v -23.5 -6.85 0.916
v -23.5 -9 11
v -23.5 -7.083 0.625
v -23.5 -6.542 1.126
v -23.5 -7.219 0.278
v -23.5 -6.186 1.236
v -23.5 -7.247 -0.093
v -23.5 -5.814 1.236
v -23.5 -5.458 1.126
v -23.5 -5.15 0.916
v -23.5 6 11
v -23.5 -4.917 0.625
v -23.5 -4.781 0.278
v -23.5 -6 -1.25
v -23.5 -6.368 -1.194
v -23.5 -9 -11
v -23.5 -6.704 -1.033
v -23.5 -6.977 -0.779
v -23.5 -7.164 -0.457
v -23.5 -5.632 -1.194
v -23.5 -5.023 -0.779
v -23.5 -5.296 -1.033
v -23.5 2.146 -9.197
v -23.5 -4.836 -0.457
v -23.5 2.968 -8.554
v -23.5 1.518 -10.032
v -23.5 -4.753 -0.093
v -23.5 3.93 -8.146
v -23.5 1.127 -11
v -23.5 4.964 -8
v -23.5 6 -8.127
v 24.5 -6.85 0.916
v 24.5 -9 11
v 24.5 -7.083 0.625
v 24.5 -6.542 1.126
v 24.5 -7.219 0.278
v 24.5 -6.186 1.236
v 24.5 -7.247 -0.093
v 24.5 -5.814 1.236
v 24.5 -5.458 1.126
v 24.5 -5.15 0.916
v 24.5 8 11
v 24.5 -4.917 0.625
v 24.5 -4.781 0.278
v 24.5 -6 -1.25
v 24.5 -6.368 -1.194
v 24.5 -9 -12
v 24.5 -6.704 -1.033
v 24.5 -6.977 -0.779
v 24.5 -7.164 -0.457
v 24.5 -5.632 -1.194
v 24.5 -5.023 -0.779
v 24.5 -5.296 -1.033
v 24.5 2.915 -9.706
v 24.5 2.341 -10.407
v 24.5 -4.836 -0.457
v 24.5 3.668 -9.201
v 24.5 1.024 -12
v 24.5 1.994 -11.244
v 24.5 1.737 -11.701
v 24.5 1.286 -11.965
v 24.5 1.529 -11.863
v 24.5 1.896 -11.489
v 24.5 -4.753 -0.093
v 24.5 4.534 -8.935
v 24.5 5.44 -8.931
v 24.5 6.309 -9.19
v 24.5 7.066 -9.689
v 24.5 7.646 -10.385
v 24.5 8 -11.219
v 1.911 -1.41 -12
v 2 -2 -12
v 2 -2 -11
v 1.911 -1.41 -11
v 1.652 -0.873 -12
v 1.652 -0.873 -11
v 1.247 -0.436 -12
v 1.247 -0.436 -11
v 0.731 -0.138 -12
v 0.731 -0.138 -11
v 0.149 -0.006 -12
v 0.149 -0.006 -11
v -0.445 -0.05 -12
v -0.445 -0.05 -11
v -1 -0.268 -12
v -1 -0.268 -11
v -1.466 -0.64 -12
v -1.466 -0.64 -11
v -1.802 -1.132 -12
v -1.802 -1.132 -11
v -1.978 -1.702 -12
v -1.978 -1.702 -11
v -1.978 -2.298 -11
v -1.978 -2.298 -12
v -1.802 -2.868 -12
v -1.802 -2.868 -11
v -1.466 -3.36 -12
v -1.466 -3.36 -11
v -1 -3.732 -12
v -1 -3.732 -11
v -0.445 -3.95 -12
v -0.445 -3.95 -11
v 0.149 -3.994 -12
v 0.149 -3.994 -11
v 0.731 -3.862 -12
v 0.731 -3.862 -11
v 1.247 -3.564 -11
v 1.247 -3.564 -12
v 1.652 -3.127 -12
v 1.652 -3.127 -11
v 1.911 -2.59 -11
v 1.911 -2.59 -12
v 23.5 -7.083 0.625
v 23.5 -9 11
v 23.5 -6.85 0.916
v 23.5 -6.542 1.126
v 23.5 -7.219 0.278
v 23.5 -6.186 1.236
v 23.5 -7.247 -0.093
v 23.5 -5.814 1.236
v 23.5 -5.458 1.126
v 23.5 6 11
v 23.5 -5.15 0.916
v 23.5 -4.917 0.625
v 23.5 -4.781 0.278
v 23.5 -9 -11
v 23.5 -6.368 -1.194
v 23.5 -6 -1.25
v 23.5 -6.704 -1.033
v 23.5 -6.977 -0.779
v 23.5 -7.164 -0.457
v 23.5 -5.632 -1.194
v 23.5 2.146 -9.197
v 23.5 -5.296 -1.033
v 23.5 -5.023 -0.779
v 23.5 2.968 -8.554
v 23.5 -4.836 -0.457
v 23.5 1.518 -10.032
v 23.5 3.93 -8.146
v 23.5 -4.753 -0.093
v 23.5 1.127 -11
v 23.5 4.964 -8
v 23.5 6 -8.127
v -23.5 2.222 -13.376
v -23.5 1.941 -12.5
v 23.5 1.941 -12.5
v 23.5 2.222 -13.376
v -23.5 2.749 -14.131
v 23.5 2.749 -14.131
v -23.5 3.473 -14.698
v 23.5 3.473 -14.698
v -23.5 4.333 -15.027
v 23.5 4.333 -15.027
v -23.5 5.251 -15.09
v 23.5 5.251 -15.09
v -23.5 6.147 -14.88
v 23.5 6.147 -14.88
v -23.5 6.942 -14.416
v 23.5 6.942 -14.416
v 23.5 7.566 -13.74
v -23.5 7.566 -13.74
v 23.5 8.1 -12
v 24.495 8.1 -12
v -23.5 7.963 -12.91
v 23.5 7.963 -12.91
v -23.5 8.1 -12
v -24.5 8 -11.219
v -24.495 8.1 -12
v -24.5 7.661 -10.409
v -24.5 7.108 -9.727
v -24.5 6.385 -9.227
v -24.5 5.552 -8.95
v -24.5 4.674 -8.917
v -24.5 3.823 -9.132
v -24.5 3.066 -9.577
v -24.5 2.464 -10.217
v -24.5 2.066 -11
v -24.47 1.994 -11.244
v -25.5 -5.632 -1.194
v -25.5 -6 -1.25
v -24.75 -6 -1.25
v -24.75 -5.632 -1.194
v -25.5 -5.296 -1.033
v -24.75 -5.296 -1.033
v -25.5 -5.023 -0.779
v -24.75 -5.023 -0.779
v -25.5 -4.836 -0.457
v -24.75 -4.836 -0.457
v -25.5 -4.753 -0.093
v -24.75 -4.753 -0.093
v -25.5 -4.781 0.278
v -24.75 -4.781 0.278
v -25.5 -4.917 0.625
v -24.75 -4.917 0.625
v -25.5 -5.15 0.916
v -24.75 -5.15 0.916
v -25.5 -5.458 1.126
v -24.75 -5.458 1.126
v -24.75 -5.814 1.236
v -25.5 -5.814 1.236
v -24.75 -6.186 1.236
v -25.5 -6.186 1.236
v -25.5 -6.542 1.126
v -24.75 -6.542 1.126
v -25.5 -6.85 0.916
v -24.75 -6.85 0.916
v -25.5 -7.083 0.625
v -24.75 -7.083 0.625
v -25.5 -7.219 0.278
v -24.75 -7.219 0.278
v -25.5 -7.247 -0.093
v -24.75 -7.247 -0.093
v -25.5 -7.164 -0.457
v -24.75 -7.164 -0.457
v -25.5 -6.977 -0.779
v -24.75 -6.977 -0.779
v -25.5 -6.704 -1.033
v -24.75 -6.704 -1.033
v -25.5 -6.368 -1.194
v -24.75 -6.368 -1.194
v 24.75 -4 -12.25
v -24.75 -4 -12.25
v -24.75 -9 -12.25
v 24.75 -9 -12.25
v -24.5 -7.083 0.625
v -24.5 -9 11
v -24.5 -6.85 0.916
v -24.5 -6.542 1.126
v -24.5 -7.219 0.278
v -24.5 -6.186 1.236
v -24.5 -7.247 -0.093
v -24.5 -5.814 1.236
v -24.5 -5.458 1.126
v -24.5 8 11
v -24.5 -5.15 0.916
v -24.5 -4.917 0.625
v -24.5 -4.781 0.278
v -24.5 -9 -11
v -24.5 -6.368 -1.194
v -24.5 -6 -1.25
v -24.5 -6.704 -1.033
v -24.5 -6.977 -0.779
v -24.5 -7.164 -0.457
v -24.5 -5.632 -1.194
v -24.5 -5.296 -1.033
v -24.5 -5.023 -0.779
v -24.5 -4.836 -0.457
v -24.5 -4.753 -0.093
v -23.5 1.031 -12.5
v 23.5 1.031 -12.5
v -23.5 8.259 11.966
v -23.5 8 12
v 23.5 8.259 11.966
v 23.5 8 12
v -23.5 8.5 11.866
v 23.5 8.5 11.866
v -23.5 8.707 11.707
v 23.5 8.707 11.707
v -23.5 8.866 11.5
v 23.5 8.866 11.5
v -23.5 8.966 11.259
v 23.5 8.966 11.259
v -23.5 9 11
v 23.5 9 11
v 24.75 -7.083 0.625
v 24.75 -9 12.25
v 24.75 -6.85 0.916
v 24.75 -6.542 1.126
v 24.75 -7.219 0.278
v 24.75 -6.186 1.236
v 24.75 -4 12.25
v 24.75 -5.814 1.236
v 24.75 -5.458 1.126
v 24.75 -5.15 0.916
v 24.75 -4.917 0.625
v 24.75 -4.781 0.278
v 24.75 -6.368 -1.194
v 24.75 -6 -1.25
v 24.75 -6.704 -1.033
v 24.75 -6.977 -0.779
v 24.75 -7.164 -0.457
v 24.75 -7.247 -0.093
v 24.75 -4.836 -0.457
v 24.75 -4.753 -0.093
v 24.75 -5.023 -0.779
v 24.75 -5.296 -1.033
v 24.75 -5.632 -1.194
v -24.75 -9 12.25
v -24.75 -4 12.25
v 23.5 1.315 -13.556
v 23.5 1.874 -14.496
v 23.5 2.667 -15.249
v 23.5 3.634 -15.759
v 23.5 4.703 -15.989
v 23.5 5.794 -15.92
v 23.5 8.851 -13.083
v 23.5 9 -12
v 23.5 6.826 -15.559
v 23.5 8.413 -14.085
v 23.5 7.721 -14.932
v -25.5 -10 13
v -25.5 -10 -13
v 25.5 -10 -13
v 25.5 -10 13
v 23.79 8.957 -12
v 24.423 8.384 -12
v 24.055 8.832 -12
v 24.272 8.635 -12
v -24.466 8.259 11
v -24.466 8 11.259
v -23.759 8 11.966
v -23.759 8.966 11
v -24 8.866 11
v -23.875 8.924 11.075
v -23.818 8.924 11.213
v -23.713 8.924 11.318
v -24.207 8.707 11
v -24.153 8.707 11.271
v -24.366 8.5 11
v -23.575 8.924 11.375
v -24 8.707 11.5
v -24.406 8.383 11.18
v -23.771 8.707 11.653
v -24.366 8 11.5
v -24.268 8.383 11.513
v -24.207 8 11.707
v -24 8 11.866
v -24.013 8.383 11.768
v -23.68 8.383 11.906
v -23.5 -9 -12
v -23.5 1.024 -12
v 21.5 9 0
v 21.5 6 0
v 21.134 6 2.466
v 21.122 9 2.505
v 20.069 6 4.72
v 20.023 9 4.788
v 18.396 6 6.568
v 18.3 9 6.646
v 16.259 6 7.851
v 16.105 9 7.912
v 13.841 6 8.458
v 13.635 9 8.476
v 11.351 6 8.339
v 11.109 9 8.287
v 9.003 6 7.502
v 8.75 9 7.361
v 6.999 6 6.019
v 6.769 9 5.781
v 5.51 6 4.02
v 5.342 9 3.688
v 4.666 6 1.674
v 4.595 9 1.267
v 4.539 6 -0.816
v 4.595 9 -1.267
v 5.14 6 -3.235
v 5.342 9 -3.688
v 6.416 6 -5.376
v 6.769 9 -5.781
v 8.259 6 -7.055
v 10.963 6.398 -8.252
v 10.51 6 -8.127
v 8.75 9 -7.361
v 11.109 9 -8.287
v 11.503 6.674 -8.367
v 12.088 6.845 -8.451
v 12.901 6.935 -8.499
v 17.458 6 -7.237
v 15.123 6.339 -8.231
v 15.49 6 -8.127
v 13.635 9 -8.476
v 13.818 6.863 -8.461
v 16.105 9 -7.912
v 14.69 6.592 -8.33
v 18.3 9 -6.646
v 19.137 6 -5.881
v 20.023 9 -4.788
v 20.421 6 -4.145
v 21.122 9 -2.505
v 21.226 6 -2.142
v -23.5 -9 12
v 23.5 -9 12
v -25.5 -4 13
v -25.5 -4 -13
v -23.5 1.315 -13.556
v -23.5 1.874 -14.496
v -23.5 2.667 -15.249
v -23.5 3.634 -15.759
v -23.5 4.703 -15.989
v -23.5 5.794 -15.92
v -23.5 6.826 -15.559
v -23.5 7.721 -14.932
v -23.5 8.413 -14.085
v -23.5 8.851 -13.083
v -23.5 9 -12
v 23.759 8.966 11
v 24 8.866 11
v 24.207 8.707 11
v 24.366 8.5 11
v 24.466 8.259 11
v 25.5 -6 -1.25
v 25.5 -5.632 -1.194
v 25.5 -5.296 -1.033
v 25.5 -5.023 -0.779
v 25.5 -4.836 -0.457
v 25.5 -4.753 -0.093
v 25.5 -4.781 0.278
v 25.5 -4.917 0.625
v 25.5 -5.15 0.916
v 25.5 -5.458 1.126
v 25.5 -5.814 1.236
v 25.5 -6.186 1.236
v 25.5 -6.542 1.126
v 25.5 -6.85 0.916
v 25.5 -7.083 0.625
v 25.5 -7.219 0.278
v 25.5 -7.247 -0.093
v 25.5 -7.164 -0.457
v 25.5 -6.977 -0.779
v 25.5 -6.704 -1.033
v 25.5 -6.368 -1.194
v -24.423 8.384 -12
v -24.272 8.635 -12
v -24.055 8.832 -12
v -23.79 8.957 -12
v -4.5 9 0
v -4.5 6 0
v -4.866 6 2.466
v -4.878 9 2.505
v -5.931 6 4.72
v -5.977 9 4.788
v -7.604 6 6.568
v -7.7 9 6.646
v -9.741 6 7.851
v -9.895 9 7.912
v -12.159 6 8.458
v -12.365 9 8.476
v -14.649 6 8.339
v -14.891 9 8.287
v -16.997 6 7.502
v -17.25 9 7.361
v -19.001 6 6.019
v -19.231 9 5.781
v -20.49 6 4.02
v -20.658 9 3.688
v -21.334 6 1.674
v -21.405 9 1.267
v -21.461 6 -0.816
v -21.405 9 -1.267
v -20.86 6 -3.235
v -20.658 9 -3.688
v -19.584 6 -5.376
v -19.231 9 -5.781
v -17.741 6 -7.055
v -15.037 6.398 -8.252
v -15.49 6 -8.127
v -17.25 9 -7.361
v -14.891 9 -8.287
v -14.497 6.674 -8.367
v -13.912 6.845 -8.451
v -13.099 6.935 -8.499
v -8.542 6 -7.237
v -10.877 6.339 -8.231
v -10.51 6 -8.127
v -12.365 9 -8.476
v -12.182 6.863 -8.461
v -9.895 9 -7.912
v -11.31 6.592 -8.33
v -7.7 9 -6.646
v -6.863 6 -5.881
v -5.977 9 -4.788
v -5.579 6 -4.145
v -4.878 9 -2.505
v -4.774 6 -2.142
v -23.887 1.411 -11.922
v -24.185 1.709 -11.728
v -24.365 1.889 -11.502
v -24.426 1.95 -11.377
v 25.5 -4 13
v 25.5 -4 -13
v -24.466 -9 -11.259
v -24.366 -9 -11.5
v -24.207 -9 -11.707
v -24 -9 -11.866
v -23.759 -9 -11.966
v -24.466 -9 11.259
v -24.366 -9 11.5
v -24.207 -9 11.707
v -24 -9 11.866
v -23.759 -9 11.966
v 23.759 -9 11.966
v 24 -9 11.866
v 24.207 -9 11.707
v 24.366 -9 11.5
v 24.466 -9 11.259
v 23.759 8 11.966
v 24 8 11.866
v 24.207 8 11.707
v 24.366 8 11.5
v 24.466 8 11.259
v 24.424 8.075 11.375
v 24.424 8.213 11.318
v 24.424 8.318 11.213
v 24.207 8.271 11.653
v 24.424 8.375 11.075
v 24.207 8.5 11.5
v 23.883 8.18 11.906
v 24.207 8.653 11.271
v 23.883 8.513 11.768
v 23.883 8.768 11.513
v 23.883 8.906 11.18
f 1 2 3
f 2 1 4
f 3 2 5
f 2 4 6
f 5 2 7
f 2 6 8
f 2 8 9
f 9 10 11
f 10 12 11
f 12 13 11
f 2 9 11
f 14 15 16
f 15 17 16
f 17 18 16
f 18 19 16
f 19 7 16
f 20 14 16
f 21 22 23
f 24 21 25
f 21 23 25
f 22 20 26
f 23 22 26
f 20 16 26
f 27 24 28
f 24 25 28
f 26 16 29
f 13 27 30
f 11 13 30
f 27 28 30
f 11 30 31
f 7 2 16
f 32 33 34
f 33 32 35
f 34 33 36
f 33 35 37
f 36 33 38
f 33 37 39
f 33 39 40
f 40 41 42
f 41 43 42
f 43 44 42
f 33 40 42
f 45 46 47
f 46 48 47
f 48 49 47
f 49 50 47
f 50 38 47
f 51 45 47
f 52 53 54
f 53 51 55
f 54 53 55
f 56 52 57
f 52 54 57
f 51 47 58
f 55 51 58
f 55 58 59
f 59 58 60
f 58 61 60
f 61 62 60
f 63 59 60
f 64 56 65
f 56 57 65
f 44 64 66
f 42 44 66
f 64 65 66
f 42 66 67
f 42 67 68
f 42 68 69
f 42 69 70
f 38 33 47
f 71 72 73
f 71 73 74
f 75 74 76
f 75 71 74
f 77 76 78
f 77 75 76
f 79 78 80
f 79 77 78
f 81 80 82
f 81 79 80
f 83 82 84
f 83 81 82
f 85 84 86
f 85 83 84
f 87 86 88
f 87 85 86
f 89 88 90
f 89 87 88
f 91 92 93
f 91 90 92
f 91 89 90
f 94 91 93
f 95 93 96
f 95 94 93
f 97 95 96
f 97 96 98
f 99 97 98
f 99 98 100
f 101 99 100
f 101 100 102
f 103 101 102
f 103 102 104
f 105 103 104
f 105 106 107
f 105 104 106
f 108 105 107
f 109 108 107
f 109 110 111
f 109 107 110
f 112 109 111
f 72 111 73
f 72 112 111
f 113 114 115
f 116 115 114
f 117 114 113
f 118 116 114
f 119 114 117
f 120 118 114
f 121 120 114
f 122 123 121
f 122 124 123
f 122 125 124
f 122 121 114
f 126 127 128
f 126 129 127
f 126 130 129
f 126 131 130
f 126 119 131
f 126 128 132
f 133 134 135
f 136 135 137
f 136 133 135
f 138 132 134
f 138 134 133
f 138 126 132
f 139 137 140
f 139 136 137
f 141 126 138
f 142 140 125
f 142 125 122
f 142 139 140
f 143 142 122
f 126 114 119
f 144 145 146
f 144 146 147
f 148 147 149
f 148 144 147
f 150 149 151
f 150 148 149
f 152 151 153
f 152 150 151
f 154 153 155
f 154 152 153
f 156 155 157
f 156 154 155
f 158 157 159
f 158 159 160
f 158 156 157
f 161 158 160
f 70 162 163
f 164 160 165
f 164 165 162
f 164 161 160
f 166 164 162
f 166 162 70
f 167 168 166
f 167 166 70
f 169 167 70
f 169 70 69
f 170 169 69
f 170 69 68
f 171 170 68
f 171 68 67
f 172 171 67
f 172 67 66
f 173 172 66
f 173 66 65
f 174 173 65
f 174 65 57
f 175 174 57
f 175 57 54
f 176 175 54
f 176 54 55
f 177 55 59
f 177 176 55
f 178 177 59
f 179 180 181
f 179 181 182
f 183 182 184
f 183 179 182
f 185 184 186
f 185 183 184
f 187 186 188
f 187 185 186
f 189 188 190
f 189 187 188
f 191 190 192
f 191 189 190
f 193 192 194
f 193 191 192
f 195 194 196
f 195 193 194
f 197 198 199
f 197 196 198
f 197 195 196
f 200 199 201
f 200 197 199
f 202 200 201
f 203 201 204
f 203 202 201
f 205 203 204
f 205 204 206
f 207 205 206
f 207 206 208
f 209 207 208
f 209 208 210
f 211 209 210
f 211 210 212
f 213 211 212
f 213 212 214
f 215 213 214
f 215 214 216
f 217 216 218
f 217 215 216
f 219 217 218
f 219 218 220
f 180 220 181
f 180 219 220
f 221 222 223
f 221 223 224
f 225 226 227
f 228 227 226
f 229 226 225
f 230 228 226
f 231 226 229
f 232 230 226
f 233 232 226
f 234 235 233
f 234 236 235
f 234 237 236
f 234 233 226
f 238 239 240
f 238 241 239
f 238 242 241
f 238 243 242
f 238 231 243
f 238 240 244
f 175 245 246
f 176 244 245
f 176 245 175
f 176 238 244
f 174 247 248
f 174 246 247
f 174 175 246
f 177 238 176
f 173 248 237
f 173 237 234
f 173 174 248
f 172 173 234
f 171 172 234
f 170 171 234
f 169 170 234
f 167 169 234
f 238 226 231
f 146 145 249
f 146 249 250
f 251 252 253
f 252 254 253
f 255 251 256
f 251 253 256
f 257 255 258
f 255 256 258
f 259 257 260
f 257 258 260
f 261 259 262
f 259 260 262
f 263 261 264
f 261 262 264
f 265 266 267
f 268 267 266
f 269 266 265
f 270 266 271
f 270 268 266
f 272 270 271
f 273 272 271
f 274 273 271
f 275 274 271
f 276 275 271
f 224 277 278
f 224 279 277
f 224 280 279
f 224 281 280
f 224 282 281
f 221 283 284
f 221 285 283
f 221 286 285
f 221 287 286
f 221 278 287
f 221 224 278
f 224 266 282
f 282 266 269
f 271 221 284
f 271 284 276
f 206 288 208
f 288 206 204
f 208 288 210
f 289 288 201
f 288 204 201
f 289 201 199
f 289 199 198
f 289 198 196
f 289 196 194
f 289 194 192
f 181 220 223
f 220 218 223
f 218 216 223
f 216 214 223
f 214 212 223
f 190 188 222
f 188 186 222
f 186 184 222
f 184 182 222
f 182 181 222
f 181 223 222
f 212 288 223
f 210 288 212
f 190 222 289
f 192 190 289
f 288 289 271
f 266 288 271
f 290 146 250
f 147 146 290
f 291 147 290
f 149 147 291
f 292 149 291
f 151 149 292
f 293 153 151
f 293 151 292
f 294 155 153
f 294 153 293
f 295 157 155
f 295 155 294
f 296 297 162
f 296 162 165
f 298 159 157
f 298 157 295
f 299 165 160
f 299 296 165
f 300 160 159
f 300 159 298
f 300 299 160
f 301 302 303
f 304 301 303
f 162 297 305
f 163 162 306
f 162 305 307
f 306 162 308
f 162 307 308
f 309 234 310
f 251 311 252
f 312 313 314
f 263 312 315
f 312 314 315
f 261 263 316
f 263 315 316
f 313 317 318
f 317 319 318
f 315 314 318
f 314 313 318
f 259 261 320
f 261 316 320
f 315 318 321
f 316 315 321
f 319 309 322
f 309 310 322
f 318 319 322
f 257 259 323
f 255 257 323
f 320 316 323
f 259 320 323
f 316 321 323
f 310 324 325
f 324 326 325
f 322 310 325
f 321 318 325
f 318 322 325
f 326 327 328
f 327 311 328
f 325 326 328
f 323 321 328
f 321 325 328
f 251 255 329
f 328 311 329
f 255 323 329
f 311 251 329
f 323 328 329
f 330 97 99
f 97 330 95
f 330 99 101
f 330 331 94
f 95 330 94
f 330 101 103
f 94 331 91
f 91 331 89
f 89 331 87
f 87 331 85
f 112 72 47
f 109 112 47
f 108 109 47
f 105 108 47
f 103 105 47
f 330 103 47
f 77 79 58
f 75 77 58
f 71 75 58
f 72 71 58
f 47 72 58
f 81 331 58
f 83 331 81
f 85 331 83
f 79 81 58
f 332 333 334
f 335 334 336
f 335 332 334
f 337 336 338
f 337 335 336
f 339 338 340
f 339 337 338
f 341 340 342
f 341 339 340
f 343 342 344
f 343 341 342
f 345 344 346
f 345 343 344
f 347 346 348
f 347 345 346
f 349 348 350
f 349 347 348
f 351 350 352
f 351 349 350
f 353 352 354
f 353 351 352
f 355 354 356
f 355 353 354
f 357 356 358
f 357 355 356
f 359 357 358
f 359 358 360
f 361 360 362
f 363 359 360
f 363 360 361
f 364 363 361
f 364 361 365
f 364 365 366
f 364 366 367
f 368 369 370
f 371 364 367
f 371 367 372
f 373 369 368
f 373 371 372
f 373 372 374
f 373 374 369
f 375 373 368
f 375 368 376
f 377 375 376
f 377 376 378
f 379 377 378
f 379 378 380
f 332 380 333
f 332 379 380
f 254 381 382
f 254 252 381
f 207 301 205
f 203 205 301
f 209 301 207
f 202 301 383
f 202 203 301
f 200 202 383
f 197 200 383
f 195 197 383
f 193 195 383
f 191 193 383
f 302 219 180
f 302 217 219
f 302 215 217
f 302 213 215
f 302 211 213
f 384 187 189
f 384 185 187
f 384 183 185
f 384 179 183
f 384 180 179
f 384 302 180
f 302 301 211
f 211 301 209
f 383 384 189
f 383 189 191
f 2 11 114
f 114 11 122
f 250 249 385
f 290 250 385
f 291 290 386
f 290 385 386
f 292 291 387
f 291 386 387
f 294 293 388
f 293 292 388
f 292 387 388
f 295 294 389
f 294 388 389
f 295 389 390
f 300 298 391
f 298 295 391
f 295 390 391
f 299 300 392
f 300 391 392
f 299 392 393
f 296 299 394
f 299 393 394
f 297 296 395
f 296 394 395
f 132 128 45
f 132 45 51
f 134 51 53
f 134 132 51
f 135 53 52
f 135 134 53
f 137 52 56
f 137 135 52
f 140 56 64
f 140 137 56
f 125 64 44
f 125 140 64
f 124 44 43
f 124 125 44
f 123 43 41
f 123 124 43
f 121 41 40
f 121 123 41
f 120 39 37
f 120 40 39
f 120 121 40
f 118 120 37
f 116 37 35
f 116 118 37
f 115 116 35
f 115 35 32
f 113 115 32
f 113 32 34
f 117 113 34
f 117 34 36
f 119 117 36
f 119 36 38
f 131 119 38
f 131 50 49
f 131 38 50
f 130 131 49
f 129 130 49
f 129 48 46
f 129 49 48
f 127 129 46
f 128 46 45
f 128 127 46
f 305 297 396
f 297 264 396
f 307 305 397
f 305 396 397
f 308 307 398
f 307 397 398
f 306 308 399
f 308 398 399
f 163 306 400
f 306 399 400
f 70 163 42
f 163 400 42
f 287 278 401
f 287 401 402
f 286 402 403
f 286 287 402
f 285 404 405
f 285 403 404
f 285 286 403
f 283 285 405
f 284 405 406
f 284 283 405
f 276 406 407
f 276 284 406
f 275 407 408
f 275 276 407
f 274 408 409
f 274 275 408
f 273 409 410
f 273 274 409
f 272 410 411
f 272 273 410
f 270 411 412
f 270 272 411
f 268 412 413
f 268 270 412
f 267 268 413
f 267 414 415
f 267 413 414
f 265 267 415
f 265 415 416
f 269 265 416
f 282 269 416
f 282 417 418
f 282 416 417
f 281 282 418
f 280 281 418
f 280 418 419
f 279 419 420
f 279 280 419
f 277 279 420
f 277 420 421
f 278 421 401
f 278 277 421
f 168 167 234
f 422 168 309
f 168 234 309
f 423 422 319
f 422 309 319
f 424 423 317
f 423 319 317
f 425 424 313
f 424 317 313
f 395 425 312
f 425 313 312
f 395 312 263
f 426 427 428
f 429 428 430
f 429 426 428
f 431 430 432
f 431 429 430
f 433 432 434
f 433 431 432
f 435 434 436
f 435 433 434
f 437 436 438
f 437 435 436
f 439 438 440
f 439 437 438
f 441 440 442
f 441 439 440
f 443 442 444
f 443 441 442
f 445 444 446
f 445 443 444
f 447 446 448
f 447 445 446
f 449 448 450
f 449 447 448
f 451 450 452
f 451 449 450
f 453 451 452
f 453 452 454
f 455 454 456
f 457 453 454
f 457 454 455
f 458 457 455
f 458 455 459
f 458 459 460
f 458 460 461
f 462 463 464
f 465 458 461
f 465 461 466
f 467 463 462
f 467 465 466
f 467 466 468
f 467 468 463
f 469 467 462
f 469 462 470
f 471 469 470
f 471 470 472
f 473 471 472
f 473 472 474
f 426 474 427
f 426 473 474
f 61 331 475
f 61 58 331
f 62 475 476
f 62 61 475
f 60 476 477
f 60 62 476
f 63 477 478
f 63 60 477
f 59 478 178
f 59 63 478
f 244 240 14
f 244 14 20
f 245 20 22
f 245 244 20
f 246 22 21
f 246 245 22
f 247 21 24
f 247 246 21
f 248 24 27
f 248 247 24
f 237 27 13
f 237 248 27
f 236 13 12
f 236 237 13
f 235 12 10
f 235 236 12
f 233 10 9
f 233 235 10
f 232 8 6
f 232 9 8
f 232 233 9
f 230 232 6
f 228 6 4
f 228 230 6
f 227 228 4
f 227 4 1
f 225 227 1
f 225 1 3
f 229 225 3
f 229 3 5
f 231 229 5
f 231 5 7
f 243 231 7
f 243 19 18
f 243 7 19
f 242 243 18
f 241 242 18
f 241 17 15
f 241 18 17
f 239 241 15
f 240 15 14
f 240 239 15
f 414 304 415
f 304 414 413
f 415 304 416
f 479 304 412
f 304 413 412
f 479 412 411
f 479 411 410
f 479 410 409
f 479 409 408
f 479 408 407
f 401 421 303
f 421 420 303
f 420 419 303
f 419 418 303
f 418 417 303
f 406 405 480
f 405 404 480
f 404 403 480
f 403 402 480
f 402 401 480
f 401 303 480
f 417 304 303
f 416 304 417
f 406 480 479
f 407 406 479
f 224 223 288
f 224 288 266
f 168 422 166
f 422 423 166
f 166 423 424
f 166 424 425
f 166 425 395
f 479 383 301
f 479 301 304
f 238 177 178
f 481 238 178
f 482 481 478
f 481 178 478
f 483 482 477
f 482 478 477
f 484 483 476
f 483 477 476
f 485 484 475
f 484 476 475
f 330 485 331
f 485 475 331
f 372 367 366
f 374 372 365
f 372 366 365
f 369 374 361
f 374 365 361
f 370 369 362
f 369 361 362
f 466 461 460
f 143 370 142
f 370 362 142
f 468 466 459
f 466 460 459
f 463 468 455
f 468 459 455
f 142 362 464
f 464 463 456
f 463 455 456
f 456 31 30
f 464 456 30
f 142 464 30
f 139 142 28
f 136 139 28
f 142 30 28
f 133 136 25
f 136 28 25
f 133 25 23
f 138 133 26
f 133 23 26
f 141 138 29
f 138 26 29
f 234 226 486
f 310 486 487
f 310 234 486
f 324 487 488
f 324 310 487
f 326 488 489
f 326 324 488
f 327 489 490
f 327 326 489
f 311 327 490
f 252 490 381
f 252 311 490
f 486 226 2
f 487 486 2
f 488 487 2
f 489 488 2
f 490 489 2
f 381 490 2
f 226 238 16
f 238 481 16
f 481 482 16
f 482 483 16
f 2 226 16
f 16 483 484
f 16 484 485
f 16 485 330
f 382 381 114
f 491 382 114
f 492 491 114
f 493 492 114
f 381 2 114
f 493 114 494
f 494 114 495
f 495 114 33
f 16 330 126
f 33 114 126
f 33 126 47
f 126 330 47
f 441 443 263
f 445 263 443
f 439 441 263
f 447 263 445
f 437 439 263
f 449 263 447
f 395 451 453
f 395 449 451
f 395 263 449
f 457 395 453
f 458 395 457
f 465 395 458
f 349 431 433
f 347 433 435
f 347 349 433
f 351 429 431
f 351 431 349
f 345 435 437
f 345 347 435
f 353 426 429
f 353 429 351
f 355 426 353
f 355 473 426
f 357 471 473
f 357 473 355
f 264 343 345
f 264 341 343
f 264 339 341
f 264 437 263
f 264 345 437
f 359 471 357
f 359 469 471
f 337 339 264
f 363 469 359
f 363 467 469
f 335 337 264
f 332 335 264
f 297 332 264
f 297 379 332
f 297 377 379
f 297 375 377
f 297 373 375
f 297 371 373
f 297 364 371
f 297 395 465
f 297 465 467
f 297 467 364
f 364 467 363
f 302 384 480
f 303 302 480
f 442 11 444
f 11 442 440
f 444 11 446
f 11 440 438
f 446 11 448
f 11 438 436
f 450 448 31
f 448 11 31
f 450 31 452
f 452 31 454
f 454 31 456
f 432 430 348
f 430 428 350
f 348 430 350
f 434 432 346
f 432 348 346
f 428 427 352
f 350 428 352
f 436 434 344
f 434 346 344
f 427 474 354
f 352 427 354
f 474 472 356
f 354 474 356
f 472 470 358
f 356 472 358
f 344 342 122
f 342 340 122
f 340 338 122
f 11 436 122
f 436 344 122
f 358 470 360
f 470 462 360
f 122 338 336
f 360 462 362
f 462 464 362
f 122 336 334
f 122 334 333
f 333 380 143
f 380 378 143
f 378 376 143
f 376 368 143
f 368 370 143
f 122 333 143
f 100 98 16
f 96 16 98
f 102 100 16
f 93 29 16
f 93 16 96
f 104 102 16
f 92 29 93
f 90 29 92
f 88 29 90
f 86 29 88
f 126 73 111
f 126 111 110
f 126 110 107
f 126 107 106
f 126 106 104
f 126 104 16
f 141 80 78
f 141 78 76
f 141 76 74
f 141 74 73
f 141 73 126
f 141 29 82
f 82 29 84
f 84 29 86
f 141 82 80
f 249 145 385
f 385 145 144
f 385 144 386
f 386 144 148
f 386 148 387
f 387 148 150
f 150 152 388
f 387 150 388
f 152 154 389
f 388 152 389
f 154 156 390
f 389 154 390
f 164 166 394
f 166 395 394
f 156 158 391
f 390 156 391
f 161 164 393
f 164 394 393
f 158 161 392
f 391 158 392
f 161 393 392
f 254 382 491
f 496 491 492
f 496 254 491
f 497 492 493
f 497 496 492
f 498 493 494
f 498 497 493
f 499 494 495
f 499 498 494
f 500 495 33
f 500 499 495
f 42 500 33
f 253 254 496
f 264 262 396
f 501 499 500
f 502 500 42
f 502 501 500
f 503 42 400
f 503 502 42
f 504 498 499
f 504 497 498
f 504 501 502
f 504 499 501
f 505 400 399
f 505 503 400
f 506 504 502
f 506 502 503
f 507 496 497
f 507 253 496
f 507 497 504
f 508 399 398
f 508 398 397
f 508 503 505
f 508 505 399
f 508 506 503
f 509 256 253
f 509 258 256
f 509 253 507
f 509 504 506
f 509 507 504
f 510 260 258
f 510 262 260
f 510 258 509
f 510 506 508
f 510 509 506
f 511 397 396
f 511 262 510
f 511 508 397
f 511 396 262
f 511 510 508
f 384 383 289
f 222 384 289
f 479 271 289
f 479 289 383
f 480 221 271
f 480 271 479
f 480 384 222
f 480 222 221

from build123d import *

# Parameters (mm, degrees)
CYLINDER005_R           = 2
CYLINDER005_DEPTH       = 10
CYLINDER004_R           = 1.25
CYLINDER004_DEPTH       = 50
CYLINDER004_PITCH_ANGLE = 90
BOX002_W                = 48
BOX002_H                = 3
BOX002_DEPTH            = 0.5
CYLINDER002_R           = 3.1
CYLINDER002_DEPTH       = 50
CYLINDER002_PITCH_ANGLE = 90
CYLINDER001_R           = 8.5
CYLINDER001_DEPTH       = 20
CYLINDER001_ROLL_ANGLE  = 90
CYLINDER_R              = 8.5
CYLINDER_DEPTH          = 20
CYLINDER_ROLL_ANGLE     = 90
BOX001_W                = 47
BOX001_H                = 16
BOX001_DEPTH            = 22
BOX_W                   = 49
BOX_H                   = 18
BOX_DEPTH               = 24
CYLINDER003_R           = 4
CYLINDER003_DEPTH       = 47
CYLINDER003_PITCH_ANGLE = 90
FILLET_R                = 1
CYLINDER006_R           = 1.25
CYLINDER006_DEPTH       = 60
CYLINDER006_PITCH_ANGLE = 90
BOX003_W                = 49.5
BOX003_H                = 18
BOX003_DEPTH            = 24.5
BOX004_W                = 51
BOX004_H                = 6
BOX004_DEPTH            = 26


with BuildPart() as cylinder003:
    # Cylinder005 → Cylinder005 (new body)
    with BuildSketch(Plane(origin=(0, -2, -17), x_dir=(1, 0, 0), z_dir=(0, 0, 1))):
        Circle(CYLINDER005_R)
    extrude(amount=CYLINDER005_DEPTH)


with BuildPart() as cylinder002:
    # Cylinder004 → Cylinder004 (new body)
    with BuildSketch(Plane.XY):
        Circle(CYLINDER004_R)
    extrude(amount=CYLINDER004_DEPTH)


with BuildPart() as cylinder002_1:
    # Cylinder004 pitch: moved
    add(cylinder002.part.rotate(Axis((0, 0, 0), (0, 1, 0)), CYLINDER004_PITCH_ANGLE))


with BuildPart() as cylinder002_2:
    # Cylinder004 placement: moved
    add(cylinder002_1.part.moved(Location((-25, -6, 0))))


with BuildPart() as cube:
    # Box002 → Box002 (new body)
    with BuildSketch(Plane(origin=(-24, 0, -12.5), x_dir=(1, 0, 0), z_dir=(0, 0, 1))):
        with Locations((24, 1.5)):
            Rectangle(BOX002_W, BOX002_H)
    extrude(amount=BOX002_DEPTH)


with BuildPart() as cylinder:
    # Cylinder002 → Cylinder002 (new body)
    with BuildSketch(Plane.XY):
        Circle(CYLINDER002_R)
    extrude(amount=CYLINDER002_DEPTH)


with BuildPart() as cylinder_1:
    # Cylinder002 pitch: moved
    add(cylinder.part.rotate(Axis((0, 0, 0), (0, 1, 0)), CYLINDER002_PITCH_ANGLE))


with BuildPart() as cylinder_2:
    # Cylinder002 placement: moved
    add(cylinder_1.part.moved(Location((-25, 5, -12))))


with BuildPart() as ultrasoun002:
    # Cylinder001 → Cylinder001 (new body)
    with BuildSketch(Plane.XY):
        Circle(CYLINDER001_R)
    extrude(amount=CYLINDER001_DEPTH)


with BuildPart() as ultrasoun002_1:
    # Cylinder001 roll: moved
    add(ultrasoun002.part.rotate(Axis((0, 0, 0), (1, 0, 0)), CYLINDER001_ROLL_ANGLE))


with BuildPart() as ultrasoun002_2:
    # Cylinder001 placement: moved
    add(ultrasoun002_1.part.moved(Location((13, 10, 0))))


with BuildPart() as f_2xultrasonidos:
    # Cylinder → Cylinder (new body)
    with BuildSketch(Plane.XY):
        Circle(CYLINDER_R)
    extrude(amount=CYLINDER_DEPTH)


with BuildPart() as f_2xultrasonidos_1:
    # Cylinder roll: moved
    add(f_2xultrasonidos.part.rotate(Axis((0, 0, 0), (1, 0, 0)), CYLINDER_ROLL_ANGLE))


with BuildPart() as f_2xultrasonidos_2:
    # Cylinder placement: moved
    add(f_2xultrasonidos_1.part.moved(Location((-13, 10, 0))))

    # Fusion: union ultraSoun002
    add(ultrasoun002_2.part)


with BuildPart() as recote_base:
    # Box001 → Box001 (new body)
    with BuildSketch(Plane(origin=(-23.5, -10, -11), x_dir=(1, 0, 0), z_dir=(0, 0, 1))):
        with Locations((23.5, 8)):
            Rectangle(BOX001_W, BOX001_H)
    extrude(amount=BOX001_DEPTH)


with BuildPart() as cut001:
    # Box → Box (new body)
    with BuildSketch(Plane(origin=(-24.5, -9, -12), x_dir=(1, 0, 0), z_dir=(0, 0, 1))):
        with Locations((24.5, 9)):
            Rectangle(BOX_W, BOX_H)
    extrude(amount=BOX_DEPTH)

    # Cut: cut recote base
    add(recote_base.part, mode=Mode.SUBTRACT)

    # Cut001: cut 2xUltrasonidos
    add(f_2xultrasonidos_2.part, mode=Mode.SUBTRACT)


with BuildPart() as fillet_body:
    # Cylinder003 → Cylinder003 (new body)
    with BuildSketch(Plane.XY):
        Circle(CYLINDER003_R)
    extrude(amount=CYLINDER003_DEPTH)


with BuildPart() as fillet_body_1:
    # Cylinder003 pitch: moved
    add(fillet_body.part.rotate(Axis((0, 0, 0), (0, 1, 0)), CYLINDER003_PITCH_ANGLE))


with BuildPart() as fillet_body_2:
    # Cylinder003 placement: moved
    add(fillet_body_1.part.moved(Location((-23.5, 5, -12))))

    # Fusion001: union Cut001
    add(cut001.part)

    # Cut002: cut Cylinder
    add(cylinder_2.part, mode=Mode.SUBTRACT)

    # Cut003: cut Cube
    add(cube.part, mode=Mode.SUBTRACT)

    # Cut004: cut Cylinder002
    add(cylinder002_2.part, mode=Mode.SUBTRACT)

    # Cut005: cut Cylinder003
    add(cylinder003.part, mode=Mode.SUBTRACT)

    # Fillet
    fillet_edges = [fillet_body_2.edges().sort_by_distance(p)[0] for p in [
        (-24.5, 0, 12),
        (-24.5, 9, 0),
        (-24.5, -3.55, -12),
        (0, 9, 12),
        (24.5, 0, 12),
        (24.5, 9, 0),
        (0, 1.9, -12),
    ]]
    fillet(fillet_edges, radius=FILLET_R)


with BuildPart() as cylinder004:
    # Cylinder006 → Cylinder006 (new body)
    with BuildSketch(Plane.XY):
        Circle(CYLINDER006_R)
    extrude(amount=CYLINDER006_DEPTH)


with BuildPart() as cylinder004_1:
    # Cylinder006 pitch: moved
    add(cylinder004.part.rotate(Axis((0, 0, 0), (0, 1, 0)), CYLINDER006_PITCH_ANGLE))


with BuildPart() as cylinder004_2:
    # Cylinder006 placement: moved
    add(cylinder004_1.part.moved(Location((-30, -6, 0))))


with BuildPart() as base001:
    # Box003 → Box003 (new body)
    with BuildSketch(Plane(origin=(-24.75, -9, -12.25), x_dir=(1, 0, 0), z_dir=(0, 0, 1))):
        with Locations((24.75, 9)):
            Rectangle(BOX003_W, BOX003_H)
    extrude(amount=BOX003_DEPTH)


with BuildPart() as cover:
    # Box004 → Box004 (new body)
    with BuildSketch(Plane(origin=(-25.5, -10, -13), x_dir=(1, 0, 0), z_dir=(0, 0, 1))):
        with Locations((25.5, 3)):
            Rectangle(BOX004_W, BOX004_H)
    extrude(amount=BOX004_DEPTH)

    # Cut006: cut base001
    add(base001.part, mode=Mode.SUBTRACT)

    # Cut007: cut Cylinder004
    add(cylinder004_2.part, mode=Mode.SUBTRACT)


solid = Compound([fillet_body_2.part, cover.part])
